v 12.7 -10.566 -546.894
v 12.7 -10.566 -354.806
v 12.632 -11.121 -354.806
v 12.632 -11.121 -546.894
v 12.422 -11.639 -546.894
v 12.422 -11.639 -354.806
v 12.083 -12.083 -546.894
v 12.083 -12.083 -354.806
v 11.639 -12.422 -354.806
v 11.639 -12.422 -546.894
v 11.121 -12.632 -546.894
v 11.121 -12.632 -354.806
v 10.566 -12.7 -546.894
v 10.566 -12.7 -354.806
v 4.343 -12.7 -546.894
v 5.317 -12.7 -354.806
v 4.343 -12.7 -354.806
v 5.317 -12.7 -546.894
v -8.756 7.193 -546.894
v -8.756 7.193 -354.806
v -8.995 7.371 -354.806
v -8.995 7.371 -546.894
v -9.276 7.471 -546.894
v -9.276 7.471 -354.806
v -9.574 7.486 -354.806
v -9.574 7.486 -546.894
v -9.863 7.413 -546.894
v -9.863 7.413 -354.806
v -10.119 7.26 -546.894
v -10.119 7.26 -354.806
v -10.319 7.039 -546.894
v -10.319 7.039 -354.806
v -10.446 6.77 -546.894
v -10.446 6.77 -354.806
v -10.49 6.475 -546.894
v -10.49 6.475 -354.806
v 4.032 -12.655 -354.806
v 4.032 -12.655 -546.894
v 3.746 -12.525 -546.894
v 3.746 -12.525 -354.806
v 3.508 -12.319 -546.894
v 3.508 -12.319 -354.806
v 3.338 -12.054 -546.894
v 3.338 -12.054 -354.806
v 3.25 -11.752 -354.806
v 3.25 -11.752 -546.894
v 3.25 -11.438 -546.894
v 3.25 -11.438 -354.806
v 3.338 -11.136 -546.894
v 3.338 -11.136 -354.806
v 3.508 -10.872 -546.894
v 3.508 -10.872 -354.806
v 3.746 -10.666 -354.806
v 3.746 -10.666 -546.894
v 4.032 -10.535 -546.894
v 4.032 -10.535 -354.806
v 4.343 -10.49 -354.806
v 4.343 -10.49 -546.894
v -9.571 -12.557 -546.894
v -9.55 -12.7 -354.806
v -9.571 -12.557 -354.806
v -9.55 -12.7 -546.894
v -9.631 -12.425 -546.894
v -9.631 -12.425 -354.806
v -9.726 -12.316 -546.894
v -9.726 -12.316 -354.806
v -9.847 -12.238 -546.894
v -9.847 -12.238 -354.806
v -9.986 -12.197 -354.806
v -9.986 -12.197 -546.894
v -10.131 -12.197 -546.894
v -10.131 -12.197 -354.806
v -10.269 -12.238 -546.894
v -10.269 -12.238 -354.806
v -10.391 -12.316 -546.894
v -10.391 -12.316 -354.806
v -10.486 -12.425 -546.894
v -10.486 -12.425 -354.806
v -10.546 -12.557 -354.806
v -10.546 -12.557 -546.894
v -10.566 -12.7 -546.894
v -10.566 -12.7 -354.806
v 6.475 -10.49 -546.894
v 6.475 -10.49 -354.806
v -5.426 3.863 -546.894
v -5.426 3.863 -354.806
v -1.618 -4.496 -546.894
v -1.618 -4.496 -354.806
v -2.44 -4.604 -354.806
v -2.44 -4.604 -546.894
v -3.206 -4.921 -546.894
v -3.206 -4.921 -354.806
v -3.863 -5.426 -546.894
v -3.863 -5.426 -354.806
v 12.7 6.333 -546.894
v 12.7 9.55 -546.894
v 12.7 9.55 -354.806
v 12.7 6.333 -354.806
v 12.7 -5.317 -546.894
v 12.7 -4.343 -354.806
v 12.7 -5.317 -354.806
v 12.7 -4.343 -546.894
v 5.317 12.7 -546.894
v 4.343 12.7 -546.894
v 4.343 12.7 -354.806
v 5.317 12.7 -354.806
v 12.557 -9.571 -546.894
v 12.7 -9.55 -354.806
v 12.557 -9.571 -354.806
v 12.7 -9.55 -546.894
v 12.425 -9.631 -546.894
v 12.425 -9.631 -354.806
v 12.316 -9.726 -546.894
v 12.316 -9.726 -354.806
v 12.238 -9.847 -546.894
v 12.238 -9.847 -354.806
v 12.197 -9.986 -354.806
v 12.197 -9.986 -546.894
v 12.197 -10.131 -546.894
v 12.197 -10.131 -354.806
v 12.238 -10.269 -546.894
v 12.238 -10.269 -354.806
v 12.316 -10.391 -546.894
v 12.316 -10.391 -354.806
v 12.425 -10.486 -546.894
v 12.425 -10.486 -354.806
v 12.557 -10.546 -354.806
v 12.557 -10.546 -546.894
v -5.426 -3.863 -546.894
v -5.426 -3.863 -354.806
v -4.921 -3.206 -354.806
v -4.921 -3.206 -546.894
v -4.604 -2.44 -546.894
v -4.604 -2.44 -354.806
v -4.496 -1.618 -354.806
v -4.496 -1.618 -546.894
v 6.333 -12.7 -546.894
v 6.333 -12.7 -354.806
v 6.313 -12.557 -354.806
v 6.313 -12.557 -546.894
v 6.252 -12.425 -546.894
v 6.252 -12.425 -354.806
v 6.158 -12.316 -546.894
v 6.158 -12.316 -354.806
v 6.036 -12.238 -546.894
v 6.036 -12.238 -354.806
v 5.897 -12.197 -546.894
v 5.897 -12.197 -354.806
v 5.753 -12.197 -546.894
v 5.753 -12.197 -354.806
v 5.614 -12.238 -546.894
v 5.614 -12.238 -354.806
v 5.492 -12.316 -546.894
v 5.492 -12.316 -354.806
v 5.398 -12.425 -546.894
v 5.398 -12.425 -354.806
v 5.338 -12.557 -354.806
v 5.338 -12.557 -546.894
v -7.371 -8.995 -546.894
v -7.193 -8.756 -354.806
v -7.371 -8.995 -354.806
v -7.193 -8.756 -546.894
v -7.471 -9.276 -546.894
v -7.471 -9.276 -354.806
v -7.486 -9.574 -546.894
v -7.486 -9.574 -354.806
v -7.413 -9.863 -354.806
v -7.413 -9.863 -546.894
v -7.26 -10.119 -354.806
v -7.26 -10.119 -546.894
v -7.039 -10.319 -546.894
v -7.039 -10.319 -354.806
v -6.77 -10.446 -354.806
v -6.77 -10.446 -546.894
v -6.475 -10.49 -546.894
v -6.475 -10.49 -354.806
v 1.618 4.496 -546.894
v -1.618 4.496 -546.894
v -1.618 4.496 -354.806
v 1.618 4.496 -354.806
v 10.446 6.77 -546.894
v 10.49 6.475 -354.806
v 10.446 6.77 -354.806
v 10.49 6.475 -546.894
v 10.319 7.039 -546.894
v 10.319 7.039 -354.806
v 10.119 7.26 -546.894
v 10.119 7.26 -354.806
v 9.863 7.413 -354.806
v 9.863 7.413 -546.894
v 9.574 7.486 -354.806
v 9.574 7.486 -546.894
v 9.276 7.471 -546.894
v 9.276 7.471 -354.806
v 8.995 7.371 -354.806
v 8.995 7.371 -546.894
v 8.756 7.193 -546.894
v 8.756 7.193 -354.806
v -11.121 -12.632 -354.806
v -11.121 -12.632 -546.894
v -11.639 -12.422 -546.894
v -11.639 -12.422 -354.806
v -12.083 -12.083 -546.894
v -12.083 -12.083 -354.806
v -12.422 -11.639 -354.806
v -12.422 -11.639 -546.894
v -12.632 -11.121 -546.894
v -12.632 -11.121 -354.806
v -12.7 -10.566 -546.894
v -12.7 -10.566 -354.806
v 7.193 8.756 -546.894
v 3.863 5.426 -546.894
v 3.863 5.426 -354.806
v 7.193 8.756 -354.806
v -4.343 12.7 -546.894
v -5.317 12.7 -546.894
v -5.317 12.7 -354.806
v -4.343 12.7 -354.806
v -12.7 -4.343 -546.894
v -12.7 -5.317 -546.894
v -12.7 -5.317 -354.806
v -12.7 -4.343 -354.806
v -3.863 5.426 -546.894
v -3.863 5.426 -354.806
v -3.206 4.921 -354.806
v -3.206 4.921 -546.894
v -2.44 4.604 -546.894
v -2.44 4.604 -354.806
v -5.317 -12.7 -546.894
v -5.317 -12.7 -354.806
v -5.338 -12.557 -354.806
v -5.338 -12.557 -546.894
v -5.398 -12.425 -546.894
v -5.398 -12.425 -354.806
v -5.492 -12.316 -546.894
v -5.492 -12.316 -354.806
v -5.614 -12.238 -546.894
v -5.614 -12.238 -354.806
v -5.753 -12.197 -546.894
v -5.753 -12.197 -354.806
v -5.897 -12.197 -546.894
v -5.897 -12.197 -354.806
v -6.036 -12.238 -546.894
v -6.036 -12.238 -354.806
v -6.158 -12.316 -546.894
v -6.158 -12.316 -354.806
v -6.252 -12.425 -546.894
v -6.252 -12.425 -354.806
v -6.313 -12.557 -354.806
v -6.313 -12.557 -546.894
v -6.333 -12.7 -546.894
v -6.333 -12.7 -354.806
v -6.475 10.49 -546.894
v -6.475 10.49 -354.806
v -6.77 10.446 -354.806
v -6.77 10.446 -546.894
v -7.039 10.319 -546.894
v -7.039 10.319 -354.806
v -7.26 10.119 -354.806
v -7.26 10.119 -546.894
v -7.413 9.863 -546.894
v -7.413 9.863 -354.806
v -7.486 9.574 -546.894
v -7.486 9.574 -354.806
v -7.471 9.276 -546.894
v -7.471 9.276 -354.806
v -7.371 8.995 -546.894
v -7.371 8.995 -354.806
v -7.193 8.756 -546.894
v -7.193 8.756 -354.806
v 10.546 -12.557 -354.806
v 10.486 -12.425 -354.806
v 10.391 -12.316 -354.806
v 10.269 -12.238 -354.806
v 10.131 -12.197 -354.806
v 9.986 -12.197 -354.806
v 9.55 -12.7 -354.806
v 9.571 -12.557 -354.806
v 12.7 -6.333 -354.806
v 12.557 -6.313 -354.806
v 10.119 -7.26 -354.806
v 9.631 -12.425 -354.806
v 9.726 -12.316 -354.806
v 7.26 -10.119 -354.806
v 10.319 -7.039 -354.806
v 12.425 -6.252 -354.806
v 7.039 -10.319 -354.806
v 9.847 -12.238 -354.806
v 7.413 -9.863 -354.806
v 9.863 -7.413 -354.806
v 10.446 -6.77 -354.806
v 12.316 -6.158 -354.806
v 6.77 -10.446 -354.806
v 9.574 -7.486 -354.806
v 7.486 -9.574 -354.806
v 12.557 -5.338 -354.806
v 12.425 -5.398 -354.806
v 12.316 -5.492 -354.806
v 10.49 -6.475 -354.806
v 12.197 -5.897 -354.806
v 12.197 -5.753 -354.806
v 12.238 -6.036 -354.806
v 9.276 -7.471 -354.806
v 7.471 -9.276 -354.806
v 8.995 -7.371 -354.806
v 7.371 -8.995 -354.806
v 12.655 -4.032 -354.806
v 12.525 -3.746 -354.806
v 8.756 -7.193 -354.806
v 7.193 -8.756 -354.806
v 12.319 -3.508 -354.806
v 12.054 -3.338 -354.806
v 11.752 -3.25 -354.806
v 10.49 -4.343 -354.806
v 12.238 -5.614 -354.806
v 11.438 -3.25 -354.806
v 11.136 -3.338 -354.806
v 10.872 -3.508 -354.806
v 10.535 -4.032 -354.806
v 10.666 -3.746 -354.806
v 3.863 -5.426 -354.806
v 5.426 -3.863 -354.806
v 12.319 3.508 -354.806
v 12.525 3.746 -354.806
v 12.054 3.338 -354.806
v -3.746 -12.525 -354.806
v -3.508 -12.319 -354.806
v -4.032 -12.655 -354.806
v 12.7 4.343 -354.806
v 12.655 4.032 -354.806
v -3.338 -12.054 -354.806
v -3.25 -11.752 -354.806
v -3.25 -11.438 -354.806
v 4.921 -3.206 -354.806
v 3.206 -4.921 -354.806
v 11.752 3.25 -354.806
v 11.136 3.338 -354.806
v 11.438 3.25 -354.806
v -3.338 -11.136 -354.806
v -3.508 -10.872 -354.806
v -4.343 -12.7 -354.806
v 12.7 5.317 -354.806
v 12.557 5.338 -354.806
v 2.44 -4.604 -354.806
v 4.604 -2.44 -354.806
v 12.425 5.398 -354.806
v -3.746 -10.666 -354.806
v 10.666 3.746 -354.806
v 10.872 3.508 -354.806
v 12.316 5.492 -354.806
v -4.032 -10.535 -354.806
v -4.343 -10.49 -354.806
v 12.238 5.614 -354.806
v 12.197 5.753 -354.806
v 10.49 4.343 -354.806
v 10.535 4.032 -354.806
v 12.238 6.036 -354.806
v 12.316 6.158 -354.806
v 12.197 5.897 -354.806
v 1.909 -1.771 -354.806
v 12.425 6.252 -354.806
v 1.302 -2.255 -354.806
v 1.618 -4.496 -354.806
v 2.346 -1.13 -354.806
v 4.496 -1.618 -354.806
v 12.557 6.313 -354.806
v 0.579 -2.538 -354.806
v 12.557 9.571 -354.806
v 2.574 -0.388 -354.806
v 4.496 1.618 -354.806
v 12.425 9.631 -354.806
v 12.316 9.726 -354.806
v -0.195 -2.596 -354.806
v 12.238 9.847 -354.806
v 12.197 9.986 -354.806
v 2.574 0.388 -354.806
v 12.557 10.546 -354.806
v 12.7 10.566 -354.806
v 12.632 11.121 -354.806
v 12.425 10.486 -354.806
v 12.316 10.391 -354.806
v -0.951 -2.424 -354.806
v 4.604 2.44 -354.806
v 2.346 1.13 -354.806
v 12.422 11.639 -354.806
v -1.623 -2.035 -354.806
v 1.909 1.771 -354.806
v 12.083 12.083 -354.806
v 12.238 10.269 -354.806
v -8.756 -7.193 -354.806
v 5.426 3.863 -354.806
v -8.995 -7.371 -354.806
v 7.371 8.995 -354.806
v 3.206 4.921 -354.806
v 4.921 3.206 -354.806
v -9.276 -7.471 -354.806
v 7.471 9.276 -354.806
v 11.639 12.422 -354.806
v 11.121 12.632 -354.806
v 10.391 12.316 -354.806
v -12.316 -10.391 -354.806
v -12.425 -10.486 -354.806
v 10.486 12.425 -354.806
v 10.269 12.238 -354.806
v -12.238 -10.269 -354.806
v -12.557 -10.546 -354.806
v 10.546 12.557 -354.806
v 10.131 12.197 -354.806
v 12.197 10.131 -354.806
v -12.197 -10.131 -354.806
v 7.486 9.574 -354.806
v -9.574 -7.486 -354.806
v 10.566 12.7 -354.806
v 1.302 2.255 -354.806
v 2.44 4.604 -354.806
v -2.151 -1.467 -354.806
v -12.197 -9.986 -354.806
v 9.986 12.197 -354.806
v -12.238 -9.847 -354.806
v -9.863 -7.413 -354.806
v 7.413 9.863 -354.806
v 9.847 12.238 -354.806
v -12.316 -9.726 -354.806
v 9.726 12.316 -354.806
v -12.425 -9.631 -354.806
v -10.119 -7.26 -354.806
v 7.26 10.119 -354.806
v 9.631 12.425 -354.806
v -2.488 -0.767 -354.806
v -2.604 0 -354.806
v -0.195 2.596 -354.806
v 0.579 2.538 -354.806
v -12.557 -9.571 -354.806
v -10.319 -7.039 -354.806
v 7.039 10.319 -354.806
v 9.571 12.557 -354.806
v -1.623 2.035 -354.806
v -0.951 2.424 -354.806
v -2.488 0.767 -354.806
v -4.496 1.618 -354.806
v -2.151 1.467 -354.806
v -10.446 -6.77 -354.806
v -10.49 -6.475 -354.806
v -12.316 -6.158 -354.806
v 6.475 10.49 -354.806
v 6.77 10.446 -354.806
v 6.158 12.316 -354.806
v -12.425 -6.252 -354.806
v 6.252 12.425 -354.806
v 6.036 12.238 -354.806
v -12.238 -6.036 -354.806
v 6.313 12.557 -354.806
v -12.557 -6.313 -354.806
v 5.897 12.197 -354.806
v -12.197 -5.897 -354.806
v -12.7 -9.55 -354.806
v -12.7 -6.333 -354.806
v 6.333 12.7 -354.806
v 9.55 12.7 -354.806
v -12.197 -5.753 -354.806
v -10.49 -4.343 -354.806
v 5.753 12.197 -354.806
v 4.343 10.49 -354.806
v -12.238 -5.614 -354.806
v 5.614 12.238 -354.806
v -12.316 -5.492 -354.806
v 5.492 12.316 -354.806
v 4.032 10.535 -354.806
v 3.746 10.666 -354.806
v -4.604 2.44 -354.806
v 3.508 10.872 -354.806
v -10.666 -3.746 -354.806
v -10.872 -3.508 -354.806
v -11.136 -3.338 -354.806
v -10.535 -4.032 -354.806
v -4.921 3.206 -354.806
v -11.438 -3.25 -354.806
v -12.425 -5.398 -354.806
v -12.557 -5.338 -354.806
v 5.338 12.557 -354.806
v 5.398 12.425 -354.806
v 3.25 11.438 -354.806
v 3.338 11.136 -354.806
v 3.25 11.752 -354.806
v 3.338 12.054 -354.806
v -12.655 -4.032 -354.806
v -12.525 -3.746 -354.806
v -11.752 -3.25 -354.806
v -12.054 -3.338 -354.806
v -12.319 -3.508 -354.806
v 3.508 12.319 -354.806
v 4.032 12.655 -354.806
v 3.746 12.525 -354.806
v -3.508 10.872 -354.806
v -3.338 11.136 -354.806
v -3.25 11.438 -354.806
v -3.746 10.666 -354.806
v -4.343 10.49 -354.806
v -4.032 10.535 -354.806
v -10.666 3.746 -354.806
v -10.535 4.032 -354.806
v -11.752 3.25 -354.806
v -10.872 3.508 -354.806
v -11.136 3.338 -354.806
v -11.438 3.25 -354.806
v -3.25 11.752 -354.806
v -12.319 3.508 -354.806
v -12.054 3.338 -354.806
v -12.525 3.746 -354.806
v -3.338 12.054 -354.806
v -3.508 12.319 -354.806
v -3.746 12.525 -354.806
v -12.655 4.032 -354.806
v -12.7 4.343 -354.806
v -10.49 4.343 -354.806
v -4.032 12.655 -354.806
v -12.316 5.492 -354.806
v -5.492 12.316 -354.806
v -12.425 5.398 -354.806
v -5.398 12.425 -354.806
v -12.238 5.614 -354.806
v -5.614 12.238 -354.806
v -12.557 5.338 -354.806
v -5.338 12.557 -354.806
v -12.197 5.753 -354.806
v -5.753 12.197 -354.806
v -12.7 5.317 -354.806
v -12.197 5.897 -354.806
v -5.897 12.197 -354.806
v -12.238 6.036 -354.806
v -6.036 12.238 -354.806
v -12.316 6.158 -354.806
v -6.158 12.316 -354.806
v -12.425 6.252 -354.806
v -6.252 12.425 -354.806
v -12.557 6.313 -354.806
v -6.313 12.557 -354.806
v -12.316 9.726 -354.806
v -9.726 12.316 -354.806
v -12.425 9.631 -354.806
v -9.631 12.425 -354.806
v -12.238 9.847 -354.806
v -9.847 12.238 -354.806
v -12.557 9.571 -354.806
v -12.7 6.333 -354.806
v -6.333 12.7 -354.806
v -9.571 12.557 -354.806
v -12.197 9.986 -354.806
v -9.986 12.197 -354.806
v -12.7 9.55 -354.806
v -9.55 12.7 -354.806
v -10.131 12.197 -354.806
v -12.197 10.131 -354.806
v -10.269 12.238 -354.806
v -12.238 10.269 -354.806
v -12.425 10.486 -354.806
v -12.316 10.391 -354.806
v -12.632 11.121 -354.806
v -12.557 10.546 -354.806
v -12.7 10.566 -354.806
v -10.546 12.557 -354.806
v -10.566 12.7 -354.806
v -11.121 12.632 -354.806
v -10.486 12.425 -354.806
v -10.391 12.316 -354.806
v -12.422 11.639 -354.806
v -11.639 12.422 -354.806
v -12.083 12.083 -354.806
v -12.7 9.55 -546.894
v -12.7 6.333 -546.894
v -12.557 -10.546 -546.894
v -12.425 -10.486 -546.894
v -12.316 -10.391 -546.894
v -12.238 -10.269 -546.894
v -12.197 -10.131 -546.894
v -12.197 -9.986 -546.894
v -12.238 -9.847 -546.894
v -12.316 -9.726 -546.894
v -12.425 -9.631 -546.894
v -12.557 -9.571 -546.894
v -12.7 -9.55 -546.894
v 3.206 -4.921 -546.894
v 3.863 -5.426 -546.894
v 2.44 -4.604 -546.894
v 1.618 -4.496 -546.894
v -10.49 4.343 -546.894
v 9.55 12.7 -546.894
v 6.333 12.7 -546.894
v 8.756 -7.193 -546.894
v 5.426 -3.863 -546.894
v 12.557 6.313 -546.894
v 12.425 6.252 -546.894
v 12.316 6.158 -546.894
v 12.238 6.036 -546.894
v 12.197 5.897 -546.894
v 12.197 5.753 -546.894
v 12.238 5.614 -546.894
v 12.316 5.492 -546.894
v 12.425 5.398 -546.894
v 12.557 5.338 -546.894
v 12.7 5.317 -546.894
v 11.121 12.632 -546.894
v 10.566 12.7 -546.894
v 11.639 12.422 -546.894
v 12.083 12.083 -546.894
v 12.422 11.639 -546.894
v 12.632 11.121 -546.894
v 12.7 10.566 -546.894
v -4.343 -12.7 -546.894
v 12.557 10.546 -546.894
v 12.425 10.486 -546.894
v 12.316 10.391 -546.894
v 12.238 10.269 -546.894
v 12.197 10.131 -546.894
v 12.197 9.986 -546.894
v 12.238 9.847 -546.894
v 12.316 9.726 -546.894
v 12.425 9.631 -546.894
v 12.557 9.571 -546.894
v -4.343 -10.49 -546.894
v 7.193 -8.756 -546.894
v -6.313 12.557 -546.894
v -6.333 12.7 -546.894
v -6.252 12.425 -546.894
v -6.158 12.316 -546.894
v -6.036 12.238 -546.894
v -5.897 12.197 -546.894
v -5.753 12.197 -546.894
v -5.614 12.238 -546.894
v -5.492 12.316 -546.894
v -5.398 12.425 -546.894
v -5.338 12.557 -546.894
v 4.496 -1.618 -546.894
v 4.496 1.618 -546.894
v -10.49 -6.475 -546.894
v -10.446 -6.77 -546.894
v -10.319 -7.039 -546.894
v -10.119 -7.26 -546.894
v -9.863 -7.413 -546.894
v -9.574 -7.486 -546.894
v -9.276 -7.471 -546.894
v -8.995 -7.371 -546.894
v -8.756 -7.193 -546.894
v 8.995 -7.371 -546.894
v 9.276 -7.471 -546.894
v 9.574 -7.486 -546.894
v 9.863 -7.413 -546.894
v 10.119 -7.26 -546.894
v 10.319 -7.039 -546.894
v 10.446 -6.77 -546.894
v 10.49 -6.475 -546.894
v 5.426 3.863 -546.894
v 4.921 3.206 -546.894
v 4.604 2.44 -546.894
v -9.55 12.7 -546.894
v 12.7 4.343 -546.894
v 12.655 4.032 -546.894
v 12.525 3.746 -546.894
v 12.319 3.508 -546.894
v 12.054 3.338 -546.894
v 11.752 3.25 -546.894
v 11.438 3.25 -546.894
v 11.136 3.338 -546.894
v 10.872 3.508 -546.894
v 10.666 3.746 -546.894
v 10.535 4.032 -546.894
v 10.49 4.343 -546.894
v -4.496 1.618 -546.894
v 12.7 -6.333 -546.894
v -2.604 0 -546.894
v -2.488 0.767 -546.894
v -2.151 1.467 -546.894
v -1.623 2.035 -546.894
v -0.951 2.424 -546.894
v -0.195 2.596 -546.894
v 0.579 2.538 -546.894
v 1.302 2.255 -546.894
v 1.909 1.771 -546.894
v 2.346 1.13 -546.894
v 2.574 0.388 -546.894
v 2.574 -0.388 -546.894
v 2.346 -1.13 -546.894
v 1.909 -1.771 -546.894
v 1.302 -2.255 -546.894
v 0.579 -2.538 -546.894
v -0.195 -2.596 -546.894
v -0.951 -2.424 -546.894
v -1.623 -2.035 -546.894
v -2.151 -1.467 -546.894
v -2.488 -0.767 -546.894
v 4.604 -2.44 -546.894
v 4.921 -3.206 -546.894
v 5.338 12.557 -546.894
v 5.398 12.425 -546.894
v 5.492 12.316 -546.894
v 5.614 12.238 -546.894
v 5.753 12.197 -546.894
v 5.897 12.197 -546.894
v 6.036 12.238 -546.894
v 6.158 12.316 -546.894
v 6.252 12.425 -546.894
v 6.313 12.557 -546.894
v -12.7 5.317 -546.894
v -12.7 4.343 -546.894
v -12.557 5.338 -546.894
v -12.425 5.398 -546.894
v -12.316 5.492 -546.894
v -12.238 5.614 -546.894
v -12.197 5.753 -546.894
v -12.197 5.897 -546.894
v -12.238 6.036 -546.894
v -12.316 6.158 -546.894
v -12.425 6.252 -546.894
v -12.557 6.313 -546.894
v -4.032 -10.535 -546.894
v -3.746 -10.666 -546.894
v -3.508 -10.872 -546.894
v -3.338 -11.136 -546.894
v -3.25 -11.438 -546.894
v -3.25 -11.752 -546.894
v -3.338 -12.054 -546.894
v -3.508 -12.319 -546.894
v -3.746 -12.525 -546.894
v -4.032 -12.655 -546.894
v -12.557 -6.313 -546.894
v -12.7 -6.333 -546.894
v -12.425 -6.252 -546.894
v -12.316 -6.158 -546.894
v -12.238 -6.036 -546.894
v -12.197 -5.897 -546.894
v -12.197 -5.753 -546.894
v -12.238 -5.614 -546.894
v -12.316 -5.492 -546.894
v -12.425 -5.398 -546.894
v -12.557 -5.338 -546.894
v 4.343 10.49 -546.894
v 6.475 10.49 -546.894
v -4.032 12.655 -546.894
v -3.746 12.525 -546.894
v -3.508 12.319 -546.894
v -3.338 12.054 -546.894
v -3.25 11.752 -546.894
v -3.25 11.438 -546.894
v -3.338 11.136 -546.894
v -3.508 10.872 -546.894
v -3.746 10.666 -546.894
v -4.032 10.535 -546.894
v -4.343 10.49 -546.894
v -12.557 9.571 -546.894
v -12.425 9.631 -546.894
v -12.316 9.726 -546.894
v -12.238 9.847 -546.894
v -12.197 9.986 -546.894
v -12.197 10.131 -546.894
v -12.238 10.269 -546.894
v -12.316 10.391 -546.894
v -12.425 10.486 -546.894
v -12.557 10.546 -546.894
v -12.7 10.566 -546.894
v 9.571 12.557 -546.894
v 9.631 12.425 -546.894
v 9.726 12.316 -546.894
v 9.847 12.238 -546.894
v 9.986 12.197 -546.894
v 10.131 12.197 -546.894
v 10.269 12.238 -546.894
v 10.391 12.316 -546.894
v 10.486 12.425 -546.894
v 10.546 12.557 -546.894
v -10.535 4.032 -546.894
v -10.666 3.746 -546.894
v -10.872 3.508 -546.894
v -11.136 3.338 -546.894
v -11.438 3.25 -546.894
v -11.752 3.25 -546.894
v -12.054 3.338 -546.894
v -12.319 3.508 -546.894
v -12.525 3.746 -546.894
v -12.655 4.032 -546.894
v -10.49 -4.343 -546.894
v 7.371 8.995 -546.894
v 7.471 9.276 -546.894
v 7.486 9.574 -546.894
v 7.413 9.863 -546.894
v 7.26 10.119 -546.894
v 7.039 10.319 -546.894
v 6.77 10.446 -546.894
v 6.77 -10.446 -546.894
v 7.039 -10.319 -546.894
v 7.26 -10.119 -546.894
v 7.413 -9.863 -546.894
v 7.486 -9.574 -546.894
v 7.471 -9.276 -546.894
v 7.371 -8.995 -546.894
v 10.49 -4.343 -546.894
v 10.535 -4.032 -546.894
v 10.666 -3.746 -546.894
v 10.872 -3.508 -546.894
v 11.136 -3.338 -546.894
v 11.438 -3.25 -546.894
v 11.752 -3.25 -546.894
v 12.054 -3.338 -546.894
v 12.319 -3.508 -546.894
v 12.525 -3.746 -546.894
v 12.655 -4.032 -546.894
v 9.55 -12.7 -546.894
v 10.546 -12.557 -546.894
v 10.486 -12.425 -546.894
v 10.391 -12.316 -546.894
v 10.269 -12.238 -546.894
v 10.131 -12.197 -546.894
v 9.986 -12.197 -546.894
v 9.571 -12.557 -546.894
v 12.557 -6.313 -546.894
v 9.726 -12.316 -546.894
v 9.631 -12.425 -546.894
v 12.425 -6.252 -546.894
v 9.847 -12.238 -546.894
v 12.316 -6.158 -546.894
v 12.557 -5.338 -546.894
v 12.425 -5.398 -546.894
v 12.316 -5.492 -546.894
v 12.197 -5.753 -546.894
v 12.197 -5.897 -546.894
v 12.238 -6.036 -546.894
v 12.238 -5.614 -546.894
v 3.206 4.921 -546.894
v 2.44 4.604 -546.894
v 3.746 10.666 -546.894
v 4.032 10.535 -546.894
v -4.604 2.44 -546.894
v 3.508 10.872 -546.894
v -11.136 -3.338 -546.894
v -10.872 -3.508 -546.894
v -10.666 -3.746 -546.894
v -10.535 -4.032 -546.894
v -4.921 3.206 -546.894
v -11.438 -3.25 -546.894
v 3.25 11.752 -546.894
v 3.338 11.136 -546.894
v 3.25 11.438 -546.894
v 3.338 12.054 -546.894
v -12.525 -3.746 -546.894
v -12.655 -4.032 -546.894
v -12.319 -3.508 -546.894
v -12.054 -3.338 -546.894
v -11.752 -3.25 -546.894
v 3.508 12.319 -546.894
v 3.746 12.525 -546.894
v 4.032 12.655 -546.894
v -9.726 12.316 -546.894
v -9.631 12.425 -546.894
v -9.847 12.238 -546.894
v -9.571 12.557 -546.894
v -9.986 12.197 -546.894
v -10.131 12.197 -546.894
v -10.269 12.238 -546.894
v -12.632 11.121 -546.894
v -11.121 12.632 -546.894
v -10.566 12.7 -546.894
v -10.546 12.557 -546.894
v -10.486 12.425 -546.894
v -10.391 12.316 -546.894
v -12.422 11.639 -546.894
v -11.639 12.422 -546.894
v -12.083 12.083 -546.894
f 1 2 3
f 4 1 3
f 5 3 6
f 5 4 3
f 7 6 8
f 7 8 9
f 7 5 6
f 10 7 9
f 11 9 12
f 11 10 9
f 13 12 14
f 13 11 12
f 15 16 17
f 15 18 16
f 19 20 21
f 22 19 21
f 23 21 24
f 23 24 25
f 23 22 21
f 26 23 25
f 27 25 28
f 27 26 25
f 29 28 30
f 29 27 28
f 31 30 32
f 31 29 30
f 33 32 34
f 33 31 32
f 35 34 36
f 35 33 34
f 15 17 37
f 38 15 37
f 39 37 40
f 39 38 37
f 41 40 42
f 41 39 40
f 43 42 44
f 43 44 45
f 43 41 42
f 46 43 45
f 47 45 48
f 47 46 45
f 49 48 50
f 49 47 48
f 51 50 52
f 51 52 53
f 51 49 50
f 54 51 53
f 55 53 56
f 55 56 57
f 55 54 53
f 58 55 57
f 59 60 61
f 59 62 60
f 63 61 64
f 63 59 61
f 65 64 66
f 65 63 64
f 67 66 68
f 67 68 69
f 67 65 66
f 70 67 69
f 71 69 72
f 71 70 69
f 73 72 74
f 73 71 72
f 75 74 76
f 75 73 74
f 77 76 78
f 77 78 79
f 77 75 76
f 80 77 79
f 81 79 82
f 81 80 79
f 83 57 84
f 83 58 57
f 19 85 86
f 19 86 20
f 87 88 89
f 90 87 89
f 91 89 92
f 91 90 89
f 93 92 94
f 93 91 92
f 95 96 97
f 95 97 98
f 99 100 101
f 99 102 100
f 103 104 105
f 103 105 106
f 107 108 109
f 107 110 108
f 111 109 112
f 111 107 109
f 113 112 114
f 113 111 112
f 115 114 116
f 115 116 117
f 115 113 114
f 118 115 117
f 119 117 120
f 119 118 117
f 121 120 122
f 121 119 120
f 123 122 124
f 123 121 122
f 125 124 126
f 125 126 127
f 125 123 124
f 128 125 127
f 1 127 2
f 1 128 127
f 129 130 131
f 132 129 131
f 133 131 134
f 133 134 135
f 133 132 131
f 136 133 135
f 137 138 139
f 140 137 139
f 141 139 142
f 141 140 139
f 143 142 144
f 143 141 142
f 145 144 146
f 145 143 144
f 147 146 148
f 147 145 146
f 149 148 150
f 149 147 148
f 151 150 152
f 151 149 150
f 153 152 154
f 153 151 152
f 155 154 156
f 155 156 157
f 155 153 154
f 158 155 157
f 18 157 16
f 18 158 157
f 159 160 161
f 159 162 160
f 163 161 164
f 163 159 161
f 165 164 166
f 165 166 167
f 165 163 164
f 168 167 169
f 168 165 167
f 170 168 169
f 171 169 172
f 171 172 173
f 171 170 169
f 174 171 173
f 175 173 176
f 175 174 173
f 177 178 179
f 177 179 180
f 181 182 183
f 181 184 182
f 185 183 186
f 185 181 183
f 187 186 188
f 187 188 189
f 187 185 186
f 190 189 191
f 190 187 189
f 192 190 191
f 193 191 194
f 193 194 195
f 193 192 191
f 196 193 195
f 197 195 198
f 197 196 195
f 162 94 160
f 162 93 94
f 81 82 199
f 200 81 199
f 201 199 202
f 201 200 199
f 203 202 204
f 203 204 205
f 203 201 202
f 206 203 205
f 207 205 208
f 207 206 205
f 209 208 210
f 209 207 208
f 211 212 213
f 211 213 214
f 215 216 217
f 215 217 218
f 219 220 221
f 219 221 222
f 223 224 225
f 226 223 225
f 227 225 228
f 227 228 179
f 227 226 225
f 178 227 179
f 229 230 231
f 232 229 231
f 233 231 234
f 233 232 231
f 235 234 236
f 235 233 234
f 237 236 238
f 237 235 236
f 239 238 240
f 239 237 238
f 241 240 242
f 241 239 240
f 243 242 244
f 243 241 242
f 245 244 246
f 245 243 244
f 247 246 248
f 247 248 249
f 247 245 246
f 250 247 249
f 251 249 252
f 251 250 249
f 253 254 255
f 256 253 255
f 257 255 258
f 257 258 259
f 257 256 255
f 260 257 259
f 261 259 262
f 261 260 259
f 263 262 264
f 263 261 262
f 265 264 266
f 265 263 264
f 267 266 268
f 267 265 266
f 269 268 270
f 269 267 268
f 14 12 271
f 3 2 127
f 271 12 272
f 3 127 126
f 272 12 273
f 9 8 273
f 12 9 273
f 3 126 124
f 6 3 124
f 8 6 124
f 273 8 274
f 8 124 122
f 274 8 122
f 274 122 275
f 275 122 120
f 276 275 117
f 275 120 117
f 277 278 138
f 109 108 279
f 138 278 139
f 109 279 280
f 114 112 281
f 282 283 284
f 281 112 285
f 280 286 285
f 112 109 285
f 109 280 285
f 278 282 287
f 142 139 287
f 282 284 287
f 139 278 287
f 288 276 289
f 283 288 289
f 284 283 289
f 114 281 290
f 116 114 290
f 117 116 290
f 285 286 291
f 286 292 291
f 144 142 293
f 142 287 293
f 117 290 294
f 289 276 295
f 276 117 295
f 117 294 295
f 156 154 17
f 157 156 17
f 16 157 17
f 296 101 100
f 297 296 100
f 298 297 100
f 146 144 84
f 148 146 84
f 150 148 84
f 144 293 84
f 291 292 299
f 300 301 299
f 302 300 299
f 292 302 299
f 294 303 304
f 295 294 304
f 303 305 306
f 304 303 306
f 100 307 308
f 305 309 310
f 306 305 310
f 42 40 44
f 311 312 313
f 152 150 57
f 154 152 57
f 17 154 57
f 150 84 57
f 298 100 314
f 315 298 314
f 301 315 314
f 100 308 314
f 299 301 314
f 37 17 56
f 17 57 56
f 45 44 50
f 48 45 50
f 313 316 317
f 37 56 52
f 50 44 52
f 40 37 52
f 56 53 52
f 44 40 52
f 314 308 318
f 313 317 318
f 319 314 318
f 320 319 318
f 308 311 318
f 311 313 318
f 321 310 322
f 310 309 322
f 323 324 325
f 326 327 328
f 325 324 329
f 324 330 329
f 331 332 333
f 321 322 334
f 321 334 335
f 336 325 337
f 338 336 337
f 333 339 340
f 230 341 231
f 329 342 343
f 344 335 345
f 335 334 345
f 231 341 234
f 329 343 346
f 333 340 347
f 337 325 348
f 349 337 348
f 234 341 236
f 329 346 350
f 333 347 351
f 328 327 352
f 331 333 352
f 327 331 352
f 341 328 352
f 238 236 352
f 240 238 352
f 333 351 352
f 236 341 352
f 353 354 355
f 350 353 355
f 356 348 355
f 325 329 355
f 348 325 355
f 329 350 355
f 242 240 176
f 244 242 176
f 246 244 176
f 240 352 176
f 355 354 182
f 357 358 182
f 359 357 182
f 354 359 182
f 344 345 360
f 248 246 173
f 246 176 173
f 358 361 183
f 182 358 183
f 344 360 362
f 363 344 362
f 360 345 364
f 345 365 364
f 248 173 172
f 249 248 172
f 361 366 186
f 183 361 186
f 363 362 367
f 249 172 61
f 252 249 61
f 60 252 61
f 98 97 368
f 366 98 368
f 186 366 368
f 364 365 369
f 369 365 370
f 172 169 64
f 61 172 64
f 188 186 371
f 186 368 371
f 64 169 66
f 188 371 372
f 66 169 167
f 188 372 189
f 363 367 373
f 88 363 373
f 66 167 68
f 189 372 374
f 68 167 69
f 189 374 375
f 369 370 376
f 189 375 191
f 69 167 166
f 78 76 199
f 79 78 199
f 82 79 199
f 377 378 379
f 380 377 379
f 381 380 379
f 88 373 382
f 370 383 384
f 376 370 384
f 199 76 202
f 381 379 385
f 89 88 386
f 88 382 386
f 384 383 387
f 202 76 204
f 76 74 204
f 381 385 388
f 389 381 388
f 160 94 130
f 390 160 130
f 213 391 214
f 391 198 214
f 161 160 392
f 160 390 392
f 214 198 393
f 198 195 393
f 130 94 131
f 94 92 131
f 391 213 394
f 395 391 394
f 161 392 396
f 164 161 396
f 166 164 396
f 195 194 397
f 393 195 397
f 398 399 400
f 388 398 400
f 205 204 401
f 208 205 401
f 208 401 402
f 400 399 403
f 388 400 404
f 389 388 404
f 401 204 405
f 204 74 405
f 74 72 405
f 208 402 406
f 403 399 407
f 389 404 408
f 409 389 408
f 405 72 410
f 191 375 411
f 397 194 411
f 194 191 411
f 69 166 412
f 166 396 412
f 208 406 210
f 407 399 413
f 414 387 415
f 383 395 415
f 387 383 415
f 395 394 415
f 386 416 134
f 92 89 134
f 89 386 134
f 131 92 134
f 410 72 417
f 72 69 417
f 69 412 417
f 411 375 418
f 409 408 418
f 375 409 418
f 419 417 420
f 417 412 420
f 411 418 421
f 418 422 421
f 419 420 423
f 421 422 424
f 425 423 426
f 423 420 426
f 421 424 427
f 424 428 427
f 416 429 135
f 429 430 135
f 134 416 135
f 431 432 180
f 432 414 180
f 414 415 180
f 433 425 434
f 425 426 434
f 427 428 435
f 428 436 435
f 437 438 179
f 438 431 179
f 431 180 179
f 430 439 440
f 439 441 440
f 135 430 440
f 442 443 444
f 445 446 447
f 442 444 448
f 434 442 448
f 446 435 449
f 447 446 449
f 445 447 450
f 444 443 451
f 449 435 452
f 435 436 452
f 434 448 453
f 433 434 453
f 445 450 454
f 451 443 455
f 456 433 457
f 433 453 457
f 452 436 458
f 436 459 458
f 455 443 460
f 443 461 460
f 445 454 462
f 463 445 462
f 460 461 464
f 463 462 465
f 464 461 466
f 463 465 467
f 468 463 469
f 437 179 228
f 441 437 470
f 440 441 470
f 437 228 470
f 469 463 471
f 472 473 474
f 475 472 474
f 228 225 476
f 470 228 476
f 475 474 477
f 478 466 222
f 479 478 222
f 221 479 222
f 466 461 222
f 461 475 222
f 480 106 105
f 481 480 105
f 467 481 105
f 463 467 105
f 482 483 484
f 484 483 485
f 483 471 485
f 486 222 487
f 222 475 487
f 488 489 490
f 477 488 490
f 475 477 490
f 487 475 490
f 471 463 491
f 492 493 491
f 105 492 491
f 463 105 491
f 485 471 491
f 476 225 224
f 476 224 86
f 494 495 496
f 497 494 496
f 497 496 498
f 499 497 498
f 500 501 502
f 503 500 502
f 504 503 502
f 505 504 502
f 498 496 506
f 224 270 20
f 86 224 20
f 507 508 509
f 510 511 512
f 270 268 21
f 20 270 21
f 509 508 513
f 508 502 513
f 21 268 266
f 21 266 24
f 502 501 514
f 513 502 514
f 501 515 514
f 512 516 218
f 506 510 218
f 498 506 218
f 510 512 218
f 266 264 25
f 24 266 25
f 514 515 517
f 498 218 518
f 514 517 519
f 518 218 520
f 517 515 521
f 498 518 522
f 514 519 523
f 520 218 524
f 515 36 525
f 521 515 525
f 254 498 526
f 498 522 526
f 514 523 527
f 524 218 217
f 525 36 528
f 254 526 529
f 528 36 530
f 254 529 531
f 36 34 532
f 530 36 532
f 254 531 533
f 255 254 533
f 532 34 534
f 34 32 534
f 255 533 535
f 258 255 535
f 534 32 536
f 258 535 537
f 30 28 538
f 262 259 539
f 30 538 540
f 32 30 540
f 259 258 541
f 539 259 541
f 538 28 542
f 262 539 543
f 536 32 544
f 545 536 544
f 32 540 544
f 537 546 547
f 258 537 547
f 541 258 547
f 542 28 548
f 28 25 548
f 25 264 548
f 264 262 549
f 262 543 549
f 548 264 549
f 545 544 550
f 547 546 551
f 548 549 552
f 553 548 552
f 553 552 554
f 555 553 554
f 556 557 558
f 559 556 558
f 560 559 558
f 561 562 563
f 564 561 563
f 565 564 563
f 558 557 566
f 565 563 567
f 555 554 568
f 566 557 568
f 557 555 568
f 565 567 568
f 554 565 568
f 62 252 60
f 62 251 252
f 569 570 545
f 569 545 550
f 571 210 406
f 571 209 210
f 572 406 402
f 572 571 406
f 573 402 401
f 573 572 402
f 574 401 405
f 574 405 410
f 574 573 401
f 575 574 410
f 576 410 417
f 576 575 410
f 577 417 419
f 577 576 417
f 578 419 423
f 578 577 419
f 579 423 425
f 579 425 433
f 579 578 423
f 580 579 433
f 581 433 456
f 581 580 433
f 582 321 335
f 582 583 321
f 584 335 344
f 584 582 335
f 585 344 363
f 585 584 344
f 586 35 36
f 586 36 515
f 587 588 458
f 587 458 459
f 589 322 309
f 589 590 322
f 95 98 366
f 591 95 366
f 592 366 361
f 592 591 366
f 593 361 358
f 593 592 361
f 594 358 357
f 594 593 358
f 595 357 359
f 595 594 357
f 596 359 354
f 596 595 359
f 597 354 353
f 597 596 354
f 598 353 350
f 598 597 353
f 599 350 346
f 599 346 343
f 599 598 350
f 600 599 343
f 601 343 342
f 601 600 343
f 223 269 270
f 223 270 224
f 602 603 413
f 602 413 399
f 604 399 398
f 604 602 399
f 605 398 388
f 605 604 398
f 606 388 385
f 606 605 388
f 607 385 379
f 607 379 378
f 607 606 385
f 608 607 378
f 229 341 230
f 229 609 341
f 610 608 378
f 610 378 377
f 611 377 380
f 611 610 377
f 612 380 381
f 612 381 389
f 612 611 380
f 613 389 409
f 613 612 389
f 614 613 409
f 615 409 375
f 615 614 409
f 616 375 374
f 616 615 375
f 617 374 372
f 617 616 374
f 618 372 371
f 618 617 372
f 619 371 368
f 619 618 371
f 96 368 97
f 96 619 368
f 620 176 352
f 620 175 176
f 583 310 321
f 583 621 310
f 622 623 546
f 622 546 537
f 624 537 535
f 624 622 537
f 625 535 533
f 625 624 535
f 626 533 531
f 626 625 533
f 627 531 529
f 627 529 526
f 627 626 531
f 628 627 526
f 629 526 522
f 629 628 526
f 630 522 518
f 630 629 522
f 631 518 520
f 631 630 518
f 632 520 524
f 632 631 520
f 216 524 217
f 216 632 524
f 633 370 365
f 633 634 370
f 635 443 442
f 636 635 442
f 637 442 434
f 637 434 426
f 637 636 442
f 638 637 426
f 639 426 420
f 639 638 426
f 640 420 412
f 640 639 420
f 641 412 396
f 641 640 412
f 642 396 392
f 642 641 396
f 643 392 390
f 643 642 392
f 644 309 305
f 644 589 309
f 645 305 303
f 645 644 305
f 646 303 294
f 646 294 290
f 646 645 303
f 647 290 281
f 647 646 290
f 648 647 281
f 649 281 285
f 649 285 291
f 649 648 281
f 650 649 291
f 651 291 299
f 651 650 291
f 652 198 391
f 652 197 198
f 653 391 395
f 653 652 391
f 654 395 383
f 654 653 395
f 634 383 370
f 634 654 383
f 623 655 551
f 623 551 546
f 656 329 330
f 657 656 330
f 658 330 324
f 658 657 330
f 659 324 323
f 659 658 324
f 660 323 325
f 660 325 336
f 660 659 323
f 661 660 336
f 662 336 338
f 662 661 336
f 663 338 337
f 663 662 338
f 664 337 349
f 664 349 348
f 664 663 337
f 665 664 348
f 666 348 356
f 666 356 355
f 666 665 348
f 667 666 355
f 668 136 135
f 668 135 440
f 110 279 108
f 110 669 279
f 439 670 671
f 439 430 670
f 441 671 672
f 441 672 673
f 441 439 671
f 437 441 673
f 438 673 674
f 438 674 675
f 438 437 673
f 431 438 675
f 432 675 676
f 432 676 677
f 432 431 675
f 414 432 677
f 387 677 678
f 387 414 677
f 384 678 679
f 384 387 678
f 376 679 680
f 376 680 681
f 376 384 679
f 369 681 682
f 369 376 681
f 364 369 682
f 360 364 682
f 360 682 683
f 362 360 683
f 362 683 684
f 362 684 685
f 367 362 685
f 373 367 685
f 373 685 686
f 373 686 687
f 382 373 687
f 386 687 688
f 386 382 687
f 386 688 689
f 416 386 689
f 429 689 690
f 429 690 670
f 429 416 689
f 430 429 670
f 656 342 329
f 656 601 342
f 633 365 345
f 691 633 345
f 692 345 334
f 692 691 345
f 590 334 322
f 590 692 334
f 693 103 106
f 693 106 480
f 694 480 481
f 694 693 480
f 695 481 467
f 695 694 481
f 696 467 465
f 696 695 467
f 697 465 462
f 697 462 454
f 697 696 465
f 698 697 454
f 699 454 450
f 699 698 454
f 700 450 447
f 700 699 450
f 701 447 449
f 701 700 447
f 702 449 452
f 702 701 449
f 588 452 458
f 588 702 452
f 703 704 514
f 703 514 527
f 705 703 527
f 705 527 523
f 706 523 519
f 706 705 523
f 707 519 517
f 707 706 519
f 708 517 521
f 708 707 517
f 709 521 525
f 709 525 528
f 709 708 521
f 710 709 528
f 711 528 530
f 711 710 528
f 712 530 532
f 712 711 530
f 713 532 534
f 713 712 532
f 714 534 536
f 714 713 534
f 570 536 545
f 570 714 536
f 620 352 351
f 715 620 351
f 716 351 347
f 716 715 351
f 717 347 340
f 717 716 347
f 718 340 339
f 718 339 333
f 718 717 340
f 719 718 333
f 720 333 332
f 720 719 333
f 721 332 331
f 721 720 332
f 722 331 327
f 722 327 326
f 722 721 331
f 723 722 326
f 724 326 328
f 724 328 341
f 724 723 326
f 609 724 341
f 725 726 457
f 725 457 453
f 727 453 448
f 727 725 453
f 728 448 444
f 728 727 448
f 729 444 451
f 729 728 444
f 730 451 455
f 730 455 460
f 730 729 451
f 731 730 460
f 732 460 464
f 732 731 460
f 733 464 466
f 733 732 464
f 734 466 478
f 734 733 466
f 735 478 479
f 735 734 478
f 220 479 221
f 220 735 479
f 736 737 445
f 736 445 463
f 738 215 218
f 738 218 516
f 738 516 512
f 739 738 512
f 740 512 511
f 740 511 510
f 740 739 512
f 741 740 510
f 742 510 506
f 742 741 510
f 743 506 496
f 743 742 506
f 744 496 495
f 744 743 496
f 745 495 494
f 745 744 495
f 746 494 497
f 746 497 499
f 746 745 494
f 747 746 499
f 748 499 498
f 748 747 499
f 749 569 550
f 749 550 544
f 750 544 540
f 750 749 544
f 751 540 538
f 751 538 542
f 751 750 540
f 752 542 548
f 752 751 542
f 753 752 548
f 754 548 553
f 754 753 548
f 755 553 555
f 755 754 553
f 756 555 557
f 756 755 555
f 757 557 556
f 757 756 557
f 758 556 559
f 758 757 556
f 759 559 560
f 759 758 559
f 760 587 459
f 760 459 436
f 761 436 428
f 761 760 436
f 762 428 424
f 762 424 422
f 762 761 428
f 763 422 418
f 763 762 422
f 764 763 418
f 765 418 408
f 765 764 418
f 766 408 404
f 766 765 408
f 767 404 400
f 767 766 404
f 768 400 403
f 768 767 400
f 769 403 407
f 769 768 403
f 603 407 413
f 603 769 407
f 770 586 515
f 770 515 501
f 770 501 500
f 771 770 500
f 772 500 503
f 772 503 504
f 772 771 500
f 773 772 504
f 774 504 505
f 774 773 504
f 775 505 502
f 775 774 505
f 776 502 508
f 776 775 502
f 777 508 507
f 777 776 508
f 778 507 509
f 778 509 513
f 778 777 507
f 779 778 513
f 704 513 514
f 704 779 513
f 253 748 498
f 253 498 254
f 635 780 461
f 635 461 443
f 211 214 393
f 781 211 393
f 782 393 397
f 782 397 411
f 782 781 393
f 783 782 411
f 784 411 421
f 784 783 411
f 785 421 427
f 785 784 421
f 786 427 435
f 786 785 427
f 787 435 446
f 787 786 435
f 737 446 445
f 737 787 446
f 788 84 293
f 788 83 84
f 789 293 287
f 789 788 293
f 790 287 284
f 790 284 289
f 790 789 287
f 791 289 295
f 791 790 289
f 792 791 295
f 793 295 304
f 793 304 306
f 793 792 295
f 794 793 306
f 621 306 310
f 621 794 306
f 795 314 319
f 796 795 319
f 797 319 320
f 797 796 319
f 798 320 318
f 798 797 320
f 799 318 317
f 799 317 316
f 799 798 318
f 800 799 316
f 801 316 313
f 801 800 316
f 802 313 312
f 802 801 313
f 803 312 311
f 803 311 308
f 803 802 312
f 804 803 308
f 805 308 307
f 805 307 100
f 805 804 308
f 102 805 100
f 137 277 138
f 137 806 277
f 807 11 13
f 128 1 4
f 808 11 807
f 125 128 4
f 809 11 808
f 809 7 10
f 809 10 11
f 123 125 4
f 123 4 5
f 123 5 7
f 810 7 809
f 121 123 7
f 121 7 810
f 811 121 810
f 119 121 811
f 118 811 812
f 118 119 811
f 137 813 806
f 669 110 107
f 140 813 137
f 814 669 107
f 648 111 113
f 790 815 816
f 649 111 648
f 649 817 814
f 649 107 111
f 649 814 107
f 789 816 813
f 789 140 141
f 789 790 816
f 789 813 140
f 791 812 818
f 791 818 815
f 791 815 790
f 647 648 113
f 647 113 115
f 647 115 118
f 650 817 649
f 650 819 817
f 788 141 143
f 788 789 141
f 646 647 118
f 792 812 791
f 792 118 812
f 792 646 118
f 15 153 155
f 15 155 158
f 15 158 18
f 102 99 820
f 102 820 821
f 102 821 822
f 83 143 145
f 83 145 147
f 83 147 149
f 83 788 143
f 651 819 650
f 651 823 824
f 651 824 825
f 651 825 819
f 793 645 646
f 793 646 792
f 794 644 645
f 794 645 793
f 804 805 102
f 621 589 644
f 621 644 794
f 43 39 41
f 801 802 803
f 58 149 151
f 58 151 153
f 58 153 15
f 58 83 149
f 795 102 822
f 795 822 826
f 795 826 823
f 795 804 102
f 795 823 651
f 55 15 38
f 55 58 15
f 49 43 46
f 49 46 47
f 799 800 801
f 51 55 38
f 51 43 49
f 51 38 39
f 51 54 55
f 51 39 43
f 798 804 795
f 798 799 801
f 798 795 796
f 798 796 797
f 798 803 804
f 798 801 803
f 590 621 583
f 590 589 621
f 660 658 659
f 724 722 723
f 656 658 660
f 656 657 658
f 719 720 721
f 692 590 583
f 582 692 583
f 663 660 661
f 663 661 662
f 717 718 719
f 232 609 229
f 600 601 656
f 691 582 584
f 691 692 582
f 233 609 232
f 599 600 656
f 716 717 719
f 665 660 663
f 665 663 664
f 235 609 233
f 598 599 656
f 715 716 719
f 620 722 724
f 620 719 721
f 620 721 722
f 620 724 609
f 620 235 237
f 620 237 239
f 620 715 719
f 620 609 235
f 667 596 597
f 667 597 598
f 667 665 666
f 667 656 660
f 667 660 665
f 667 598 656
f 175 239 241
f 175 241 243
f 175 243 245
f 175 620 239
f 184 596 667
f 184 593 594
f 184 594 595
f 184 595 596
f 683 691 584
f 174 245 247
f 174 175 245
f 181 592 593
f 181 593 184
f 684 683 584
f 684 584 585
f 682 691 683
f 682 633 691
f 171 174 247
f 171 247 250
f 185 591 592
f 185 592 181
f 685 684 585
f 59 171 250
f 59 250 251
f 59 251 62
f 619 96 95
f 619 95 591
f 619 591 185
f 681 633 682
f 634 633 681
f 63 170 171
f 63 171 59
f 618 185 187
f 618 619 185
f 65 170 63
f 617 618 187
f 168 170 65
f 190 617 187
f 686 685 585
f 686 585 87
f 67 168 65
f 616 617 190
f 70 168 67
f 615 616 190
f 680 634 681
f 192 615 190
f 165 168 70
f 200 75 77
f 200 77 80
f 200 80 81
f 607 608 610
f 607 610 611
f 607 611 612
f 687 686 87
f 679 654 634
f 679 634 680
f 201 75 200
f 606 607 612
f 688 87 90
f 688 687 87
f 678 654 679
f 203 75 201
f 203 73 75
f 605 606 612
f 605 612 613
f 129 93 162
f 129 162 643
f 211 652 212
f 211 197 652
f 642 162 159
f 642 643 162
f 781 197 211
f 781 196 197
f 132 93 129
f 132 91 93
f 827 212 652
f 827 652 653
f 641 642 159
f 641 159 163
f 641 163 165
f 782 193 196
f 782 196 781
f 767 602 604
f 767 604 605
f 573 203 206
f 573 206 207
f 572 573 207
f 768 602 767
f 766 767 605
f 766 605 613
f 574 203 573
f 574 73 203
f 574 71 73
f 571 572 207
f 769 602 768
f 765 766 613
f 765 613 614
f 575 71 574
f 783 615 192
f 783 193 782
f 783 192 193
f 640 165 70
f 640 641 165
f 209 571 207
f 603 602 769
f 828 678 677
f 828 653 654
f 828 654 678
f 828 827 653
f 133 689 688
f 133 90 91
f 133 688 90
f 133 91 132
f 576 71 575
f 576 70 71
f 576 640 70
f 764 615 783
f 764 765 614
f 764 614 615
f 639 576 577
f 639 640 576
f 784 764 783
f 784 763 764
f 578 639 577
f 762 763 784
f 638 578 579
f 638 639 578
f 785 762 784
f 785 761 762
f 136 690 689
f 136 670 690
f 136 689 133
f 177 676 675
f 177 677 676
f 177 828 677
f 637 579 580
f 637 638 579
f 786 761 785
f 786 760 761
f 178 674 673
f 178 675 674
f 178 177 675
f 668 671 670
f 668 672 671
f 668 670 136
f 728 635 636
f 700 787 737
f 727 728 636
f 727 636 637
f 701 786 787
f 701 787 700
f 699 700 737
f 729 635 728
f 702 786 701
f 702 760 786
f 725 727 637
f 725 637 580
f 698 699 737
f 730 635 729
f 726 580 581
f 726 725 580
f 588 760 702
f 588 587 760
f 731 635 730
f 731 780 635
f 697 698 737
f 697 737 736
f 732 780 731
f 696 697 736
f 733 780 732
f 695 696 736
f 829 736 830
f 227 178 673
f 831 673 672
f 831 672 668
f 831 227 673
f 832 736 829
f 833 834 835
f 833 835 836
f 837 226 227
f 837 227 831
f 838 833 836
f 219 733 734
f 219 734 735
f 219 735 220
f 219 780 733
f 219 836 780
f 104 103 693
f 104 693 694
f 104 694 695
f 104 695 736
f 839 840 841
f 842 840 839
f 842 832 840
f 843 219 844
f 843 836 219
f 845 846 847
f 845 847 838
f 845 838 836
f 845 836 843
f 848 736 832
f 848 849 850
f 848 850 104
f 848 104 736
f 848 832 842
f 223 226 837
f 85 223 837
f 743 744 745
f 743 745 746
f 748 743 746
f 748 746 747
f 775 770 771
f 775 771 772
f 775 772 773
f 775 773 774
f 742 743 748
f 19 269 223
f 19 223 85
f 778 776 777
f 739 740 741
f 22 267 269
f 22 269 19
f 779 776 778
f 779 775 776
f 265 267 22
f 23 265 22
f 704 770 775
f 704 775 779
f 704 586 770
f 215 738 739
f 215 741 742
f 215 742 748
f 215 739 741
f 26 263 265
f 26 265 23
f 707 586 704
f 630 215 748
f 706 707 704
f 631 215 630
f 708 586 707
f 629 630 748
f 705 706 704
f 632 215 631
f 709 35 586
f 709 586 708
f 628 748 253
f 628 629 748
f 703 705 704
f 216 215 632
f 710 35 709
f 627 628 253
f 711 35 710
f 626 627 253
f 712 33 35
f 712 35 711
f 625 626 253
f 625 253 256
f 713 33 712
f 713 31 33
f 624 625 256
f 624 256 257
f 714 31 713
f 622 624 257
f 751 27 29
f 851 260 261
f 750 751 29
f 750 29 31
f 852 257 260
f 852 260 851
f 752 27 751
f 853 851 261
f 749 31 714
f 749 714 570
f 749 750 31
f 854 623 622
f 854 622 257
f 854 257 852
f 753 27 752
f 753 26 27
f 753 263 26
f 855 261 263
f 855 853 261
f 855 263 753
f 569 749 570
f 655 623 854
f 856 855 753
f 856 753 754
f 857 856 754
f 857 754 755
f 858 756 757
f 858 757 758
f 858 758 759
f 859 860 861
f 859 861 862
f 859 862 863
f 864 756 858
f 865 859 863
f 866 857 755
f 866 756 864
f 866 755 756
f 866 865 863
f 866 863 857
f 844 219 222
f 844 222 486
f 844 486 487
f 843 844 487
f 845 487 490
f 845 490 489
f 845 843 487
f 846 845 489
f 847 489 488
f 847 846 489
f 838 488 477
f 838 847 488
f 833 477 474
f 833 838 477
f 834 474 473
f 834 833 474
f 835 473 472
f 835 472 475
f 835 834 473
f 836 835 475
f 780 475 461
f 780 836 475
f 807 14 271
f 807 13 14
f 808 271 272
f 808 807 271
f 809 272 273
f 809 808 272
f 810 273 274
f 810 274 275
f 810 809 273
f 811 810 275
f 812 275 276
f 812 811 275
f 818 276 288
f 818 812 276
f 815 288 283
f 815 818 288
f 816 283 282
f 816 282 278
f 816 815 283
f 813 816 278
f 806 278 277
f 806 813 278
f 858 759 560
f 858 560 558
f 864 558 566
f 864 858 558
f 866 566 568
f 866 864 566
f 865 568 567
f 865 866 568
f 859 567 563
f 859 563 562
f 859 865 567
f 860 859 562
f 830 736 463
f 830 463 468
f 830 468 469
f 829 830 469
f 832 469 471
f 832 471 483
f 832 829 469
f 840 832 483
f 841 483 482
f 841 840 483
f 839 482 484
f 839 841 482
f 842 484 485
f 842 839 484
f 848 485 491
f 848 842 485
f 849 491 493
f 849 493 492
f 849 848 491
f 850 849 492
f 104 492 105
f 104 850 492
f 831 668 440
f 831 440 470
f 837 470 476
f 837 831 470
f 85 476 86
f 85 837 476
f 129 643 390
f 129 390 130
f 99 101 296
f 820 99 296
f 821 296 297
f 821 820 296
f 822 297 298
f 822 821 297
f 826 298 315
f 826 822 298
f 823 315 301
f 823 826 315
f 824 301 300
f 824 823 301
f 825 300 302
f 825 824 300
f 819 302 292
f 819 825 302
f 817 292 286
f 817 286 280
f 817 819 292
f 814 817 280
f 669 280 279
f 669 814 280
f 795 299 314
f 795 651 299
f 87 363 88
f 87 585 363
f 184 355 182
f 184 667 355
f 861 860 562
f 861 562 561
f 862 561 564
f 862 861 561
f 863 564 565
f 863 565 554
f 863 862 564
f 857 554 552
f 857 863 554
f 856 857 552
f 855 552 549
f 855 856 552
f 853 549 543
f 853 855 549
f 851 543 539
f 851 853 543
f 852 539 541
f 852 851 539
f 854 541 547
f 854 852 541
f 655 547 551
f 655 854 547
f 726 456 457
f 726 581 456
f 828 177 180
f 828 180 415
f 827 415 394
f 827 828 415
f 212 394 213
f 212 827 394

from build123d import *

# Parameters (mm, degrees)
SKETCH1_R           = 2.6035
BOSS_EXTRUDE1_DEPTH = 96.04375


with BuildPart() as part:
    # Sketch1 → Boss-Extrude1 (new body, symmetric)
    with BuildSketch(Plane(origin=(0, 0, -450.85), x_dir=(-1, 0, 0), z_dir=(0, 0, -1))):
        with BuildLine():
            Line((12.7, -9.5504), (12.7, -6.3330836))
            ThreePointArc((12.7, -6.3330836), (12.192, -5.8250836), (12.7, -5.3170836))
            Line((12.7, -5.3170836), (12.7, -4.3434))
            ThreePointArc((12.7, -4.3434), (11.5951, -3.2385), (10.4902, -4.3434))
            Line((10.4902, -4.3434), (10.4902, -6.474794456))
            ThreePointArc((10.4902, -6.474794456), (9.863006367, -7.413456061), (8.75577951, -7.193214945))
            Line((8.75577951, -7.193214945), (5.42573597, -3.863171405))
            ThreePointArc((5.42573597, -3.863171405), (4.737482484, -2.833127272), (4.4958, -1.618107374))
            Line((4.4958, -1.618107374), (4.4958, 1.618107374))
            ThreePointArc((4.4958, 1.618107374), (4.737482484, 2.833127272), (5.42573597, 3.863171405))
            Line((5.42573597, 3.863171405), (8.75577951, 7.193214945))
            ThreePointArc((8.75577951, 7.193214945), (9.863006367, 7.413456061), (10.4902, 6.474794456))
            Line((10.4902, 6.474794456), (10.4902, 4.343399971))
            ThreePointArc((10.4902, 4.343399971), (11.5951, 3.238499971), (12.7, 4.343399971))
            Line((12.7, 4.343399971), (12.7, 5.3170836))
            ThreePointArc((12.7, 5.3170836), (12.192, 5.8250836), (12.7, 6.3330836))
            Line((12.7, 6.3330836), (12.7, 9.5504))
            ThreePointArc((12.7, 9.5504), (12.192000006, 10.058323491), (12.699846982, 10.566399977))
            ThreePointArc((12.699846982, 10.566399977), (12.082522516, 12.082522516), (10.566399977, 12.699846982))
            ThreePointArc((10.566399977, 12.699846982), (10.058323491, 12.192000006), (9.5504, 12.7))
            Line((9.5504, 12.7), (6.3330836, 12.7))
            ThreePointArc((6.3330836, 12.7), (5.8250836, 12.192), (5.3170836, 12.7))
            Line((5.3170836, 12.7), (4.3434, 12.7))
            ThreePointArc((4.3434, 12.7), (3.2385, 11.5951), (4.3434, 10.4902))
            Line((4.3434, 10.4902), (6.474794456, 10.4902))
            ThreePointArc((6.474794456, 10.4902), (7.413456061, 9.863006367), (7.193214945, 8.75577951))
            Line((7.193214945, 8.75577951), (3.863171405, 5.42573597))
            ThreePointArc((3.863171405, 5.42573597), (2.833127272, 4.737482484), (1.618107374, 4.4958))
            Line((1.618107374, 4.4958), (-1.618107374, 4.4958))
            ThreePointArc((-1.618107374, 4.4958), (-2.833127272, 4.737482484), (-3.863171405, 5.42573597))
            Line((-3.863171405, 5.42573597), (-7.193214945, 8.75577951))
            ThreePointArc((-7.193214945, 8.75577951), (-7.413456061, 9.863006367), (-6.474794456, 10.4902))
            Line((-6.474794456, 10.4902), (-4.343399971, 10.4902))
            ThreePointArc((-4.343399971, 10.4902), (-3.238499971, 11.5951), (-4.343399971, 12.7))
            Line((-4.343399971, 12.7), (-5.3170836, 12.7))
            ThreePointArc((-5.3170836, 12.7), (-5.8250836, 12.192), (-6.3330836, 12.7))
            Line((-6.3330836, 12.7), (-9.5504, 12.7))
            ThreePointArc((-9.5504, 12.7), (-10.058323491, 12.192000006), (-10.566399977, 12.699846982))
            ThreePointArc((-10.566399977, 12.699846982), (-12.082522516, 12.082522516), (-12.699846982, 10.566399977))
            ThreePointArc((-12.699846982, 10.566399977), (-12.192000006, 10.058323491), (-12.7, 9.5504))
            Line((-12.7, 9.5504), (-12.7, 6.3330836))
            ThreePointArc((-12.7, 6.3330836), (-12.192, 5.8250836), (-12.7, 5.3170836))
            Line((-12.7, 5.3170836), (-12.7, 4.3434))
            ThreePointArc((-12.7, 4.3434), (-11.5951, 3.2385), (-10.4902, 4.3434))
            Line((-10.4902, 4.3434), (-10.4902, 6.474794456))
            ThreePointArc((-10.4902, 6.474794456), (-9.863006367, 7.413456061), (-8.75577951, 7.193214945))
            Line((-8.75577951, 7.193214945), (-5.42573597, 3.863171405))
            ThreePointArc((-5.42573597, 3.863171405), (-4.737482484, 2.833127272), (-4.4958, 1.618107374))
            Line((-4.4958, 1.618107374), (-4.4958, -1.618107374))
            ThreePointArc((-4.4958, -1.618107374), (-4.737482484, -2.833127272), (-5.42573597, -3.863171405))
            Line((-5.42573597, -3.863171405), (-8.75577951, -7.193214945))
            ThreePointArc((-8.75577951, -7.193214945), (-9.863006367, -7.413456061), (-10.4902, -6.474794456))
            Line((-10.4902, -6.474794456), (-10.4902, -4.343399971))
            ThreePointArc((-10.4902, -4.343399971), (-11.5951, -3.238499971), (-12.7, -4.343399971))
            Line((-12.7, -4.343399971), (-12.7, -5.3170836))
            ThreePointArc((-12.7, -5.3170836), (-12.192, -5.8250836), (-12.7, -6.3330836))
            Line((-12.7, -6.3330836), (-12.7, -9.5504))
            ThreePointArc((-12.7, -9.5504), (-12.192000006, -10.058323491), (-12.699846982, -10.566399977))
            ThreePointArc((-12.699846982, -10.566399977), (-12.082522516, -12.082522516), (-10.566399977, -12.699846982))
            ThreePointArc((-10.566399977, -12.699846982), (-10.058323491, -12.192000006), (-9.5504, -12.7))
            Line((-9.5504, -12.7), (-6.3330836, -12.7))
            ThreePointArc((-6.3330836, -12.7), (-5.8250836, -12.192), (-5.3170836, -12.7))
            Line((-5.3170836, -12.7), (-4.3434, -12.7))
            ThreePointArc((-4.3434, -12.7), (-3.2385, -11.5951), (-4.3434, -10.4902))
            Line((-4.3434, -10.4902), (-6.474794456, -10.4902))
            ThreePointArc((-6.474794456, -10.4902), (-7.413456061, -9.863006367), (-7.193214945, -8.75577951))
            Line((-7.193214945, -8.75577951), (-3.863171405, -5.42573597))
            ThreePointArc((-3.863171405, -5.42573597), (-2.833127272, -4.737482484), (-1.618107374, -4.4958))
            Line((-1.618107374, -4.4958), (1.618107374, -4.4958))
            ThreePointArc((1.618107374, -4.4958), (2.833127272, -4.737482484), (3.863171405, -5.42573597))
            Line((3.863171405, -5.42573597), (7.193214945, -8.75577951))
            ThreePointArc((7.193214945, -8.75577951), (7.413456061, -9.863006367), (6.474794456, -10.4902))
            Line((6.474794456, -10.4902), (4.343399971, -10.4902))
            ThreePointArc((4.343399971, -10.4902), (3.238499971, -11.5951), (4.343399971, -12.7))
            Line((4.343399971, -12.7), (5.3170836, -12.7))
            ThreePointArc((5.3170836, -12.7), (5.8250836, -12.192), (6.3330836, -12.7))
            Line((6.3330836, -12.7), (9.5504, -12.7))
            ThreePointArc((9.5504, -12.7), (10.058323491, -12.192000006), (10.566399977, -12.699846982))
            ThreePointArc((10.566399977, -12.699846982), (12.082522516, -12.082522516), (12.699846982, -10.566399977))
            ThreePointArc((12.699846982, -10.566399977), (12.192000006, -10.058323491), (12.7, -9.5504))
        make_face()
        Circle(SKETCH1_R, mode=Mode.SUBTRACT)
    extrude(amount=BOSS_EXTRUDE1_DEPTH, both=True)


solid = part.part
